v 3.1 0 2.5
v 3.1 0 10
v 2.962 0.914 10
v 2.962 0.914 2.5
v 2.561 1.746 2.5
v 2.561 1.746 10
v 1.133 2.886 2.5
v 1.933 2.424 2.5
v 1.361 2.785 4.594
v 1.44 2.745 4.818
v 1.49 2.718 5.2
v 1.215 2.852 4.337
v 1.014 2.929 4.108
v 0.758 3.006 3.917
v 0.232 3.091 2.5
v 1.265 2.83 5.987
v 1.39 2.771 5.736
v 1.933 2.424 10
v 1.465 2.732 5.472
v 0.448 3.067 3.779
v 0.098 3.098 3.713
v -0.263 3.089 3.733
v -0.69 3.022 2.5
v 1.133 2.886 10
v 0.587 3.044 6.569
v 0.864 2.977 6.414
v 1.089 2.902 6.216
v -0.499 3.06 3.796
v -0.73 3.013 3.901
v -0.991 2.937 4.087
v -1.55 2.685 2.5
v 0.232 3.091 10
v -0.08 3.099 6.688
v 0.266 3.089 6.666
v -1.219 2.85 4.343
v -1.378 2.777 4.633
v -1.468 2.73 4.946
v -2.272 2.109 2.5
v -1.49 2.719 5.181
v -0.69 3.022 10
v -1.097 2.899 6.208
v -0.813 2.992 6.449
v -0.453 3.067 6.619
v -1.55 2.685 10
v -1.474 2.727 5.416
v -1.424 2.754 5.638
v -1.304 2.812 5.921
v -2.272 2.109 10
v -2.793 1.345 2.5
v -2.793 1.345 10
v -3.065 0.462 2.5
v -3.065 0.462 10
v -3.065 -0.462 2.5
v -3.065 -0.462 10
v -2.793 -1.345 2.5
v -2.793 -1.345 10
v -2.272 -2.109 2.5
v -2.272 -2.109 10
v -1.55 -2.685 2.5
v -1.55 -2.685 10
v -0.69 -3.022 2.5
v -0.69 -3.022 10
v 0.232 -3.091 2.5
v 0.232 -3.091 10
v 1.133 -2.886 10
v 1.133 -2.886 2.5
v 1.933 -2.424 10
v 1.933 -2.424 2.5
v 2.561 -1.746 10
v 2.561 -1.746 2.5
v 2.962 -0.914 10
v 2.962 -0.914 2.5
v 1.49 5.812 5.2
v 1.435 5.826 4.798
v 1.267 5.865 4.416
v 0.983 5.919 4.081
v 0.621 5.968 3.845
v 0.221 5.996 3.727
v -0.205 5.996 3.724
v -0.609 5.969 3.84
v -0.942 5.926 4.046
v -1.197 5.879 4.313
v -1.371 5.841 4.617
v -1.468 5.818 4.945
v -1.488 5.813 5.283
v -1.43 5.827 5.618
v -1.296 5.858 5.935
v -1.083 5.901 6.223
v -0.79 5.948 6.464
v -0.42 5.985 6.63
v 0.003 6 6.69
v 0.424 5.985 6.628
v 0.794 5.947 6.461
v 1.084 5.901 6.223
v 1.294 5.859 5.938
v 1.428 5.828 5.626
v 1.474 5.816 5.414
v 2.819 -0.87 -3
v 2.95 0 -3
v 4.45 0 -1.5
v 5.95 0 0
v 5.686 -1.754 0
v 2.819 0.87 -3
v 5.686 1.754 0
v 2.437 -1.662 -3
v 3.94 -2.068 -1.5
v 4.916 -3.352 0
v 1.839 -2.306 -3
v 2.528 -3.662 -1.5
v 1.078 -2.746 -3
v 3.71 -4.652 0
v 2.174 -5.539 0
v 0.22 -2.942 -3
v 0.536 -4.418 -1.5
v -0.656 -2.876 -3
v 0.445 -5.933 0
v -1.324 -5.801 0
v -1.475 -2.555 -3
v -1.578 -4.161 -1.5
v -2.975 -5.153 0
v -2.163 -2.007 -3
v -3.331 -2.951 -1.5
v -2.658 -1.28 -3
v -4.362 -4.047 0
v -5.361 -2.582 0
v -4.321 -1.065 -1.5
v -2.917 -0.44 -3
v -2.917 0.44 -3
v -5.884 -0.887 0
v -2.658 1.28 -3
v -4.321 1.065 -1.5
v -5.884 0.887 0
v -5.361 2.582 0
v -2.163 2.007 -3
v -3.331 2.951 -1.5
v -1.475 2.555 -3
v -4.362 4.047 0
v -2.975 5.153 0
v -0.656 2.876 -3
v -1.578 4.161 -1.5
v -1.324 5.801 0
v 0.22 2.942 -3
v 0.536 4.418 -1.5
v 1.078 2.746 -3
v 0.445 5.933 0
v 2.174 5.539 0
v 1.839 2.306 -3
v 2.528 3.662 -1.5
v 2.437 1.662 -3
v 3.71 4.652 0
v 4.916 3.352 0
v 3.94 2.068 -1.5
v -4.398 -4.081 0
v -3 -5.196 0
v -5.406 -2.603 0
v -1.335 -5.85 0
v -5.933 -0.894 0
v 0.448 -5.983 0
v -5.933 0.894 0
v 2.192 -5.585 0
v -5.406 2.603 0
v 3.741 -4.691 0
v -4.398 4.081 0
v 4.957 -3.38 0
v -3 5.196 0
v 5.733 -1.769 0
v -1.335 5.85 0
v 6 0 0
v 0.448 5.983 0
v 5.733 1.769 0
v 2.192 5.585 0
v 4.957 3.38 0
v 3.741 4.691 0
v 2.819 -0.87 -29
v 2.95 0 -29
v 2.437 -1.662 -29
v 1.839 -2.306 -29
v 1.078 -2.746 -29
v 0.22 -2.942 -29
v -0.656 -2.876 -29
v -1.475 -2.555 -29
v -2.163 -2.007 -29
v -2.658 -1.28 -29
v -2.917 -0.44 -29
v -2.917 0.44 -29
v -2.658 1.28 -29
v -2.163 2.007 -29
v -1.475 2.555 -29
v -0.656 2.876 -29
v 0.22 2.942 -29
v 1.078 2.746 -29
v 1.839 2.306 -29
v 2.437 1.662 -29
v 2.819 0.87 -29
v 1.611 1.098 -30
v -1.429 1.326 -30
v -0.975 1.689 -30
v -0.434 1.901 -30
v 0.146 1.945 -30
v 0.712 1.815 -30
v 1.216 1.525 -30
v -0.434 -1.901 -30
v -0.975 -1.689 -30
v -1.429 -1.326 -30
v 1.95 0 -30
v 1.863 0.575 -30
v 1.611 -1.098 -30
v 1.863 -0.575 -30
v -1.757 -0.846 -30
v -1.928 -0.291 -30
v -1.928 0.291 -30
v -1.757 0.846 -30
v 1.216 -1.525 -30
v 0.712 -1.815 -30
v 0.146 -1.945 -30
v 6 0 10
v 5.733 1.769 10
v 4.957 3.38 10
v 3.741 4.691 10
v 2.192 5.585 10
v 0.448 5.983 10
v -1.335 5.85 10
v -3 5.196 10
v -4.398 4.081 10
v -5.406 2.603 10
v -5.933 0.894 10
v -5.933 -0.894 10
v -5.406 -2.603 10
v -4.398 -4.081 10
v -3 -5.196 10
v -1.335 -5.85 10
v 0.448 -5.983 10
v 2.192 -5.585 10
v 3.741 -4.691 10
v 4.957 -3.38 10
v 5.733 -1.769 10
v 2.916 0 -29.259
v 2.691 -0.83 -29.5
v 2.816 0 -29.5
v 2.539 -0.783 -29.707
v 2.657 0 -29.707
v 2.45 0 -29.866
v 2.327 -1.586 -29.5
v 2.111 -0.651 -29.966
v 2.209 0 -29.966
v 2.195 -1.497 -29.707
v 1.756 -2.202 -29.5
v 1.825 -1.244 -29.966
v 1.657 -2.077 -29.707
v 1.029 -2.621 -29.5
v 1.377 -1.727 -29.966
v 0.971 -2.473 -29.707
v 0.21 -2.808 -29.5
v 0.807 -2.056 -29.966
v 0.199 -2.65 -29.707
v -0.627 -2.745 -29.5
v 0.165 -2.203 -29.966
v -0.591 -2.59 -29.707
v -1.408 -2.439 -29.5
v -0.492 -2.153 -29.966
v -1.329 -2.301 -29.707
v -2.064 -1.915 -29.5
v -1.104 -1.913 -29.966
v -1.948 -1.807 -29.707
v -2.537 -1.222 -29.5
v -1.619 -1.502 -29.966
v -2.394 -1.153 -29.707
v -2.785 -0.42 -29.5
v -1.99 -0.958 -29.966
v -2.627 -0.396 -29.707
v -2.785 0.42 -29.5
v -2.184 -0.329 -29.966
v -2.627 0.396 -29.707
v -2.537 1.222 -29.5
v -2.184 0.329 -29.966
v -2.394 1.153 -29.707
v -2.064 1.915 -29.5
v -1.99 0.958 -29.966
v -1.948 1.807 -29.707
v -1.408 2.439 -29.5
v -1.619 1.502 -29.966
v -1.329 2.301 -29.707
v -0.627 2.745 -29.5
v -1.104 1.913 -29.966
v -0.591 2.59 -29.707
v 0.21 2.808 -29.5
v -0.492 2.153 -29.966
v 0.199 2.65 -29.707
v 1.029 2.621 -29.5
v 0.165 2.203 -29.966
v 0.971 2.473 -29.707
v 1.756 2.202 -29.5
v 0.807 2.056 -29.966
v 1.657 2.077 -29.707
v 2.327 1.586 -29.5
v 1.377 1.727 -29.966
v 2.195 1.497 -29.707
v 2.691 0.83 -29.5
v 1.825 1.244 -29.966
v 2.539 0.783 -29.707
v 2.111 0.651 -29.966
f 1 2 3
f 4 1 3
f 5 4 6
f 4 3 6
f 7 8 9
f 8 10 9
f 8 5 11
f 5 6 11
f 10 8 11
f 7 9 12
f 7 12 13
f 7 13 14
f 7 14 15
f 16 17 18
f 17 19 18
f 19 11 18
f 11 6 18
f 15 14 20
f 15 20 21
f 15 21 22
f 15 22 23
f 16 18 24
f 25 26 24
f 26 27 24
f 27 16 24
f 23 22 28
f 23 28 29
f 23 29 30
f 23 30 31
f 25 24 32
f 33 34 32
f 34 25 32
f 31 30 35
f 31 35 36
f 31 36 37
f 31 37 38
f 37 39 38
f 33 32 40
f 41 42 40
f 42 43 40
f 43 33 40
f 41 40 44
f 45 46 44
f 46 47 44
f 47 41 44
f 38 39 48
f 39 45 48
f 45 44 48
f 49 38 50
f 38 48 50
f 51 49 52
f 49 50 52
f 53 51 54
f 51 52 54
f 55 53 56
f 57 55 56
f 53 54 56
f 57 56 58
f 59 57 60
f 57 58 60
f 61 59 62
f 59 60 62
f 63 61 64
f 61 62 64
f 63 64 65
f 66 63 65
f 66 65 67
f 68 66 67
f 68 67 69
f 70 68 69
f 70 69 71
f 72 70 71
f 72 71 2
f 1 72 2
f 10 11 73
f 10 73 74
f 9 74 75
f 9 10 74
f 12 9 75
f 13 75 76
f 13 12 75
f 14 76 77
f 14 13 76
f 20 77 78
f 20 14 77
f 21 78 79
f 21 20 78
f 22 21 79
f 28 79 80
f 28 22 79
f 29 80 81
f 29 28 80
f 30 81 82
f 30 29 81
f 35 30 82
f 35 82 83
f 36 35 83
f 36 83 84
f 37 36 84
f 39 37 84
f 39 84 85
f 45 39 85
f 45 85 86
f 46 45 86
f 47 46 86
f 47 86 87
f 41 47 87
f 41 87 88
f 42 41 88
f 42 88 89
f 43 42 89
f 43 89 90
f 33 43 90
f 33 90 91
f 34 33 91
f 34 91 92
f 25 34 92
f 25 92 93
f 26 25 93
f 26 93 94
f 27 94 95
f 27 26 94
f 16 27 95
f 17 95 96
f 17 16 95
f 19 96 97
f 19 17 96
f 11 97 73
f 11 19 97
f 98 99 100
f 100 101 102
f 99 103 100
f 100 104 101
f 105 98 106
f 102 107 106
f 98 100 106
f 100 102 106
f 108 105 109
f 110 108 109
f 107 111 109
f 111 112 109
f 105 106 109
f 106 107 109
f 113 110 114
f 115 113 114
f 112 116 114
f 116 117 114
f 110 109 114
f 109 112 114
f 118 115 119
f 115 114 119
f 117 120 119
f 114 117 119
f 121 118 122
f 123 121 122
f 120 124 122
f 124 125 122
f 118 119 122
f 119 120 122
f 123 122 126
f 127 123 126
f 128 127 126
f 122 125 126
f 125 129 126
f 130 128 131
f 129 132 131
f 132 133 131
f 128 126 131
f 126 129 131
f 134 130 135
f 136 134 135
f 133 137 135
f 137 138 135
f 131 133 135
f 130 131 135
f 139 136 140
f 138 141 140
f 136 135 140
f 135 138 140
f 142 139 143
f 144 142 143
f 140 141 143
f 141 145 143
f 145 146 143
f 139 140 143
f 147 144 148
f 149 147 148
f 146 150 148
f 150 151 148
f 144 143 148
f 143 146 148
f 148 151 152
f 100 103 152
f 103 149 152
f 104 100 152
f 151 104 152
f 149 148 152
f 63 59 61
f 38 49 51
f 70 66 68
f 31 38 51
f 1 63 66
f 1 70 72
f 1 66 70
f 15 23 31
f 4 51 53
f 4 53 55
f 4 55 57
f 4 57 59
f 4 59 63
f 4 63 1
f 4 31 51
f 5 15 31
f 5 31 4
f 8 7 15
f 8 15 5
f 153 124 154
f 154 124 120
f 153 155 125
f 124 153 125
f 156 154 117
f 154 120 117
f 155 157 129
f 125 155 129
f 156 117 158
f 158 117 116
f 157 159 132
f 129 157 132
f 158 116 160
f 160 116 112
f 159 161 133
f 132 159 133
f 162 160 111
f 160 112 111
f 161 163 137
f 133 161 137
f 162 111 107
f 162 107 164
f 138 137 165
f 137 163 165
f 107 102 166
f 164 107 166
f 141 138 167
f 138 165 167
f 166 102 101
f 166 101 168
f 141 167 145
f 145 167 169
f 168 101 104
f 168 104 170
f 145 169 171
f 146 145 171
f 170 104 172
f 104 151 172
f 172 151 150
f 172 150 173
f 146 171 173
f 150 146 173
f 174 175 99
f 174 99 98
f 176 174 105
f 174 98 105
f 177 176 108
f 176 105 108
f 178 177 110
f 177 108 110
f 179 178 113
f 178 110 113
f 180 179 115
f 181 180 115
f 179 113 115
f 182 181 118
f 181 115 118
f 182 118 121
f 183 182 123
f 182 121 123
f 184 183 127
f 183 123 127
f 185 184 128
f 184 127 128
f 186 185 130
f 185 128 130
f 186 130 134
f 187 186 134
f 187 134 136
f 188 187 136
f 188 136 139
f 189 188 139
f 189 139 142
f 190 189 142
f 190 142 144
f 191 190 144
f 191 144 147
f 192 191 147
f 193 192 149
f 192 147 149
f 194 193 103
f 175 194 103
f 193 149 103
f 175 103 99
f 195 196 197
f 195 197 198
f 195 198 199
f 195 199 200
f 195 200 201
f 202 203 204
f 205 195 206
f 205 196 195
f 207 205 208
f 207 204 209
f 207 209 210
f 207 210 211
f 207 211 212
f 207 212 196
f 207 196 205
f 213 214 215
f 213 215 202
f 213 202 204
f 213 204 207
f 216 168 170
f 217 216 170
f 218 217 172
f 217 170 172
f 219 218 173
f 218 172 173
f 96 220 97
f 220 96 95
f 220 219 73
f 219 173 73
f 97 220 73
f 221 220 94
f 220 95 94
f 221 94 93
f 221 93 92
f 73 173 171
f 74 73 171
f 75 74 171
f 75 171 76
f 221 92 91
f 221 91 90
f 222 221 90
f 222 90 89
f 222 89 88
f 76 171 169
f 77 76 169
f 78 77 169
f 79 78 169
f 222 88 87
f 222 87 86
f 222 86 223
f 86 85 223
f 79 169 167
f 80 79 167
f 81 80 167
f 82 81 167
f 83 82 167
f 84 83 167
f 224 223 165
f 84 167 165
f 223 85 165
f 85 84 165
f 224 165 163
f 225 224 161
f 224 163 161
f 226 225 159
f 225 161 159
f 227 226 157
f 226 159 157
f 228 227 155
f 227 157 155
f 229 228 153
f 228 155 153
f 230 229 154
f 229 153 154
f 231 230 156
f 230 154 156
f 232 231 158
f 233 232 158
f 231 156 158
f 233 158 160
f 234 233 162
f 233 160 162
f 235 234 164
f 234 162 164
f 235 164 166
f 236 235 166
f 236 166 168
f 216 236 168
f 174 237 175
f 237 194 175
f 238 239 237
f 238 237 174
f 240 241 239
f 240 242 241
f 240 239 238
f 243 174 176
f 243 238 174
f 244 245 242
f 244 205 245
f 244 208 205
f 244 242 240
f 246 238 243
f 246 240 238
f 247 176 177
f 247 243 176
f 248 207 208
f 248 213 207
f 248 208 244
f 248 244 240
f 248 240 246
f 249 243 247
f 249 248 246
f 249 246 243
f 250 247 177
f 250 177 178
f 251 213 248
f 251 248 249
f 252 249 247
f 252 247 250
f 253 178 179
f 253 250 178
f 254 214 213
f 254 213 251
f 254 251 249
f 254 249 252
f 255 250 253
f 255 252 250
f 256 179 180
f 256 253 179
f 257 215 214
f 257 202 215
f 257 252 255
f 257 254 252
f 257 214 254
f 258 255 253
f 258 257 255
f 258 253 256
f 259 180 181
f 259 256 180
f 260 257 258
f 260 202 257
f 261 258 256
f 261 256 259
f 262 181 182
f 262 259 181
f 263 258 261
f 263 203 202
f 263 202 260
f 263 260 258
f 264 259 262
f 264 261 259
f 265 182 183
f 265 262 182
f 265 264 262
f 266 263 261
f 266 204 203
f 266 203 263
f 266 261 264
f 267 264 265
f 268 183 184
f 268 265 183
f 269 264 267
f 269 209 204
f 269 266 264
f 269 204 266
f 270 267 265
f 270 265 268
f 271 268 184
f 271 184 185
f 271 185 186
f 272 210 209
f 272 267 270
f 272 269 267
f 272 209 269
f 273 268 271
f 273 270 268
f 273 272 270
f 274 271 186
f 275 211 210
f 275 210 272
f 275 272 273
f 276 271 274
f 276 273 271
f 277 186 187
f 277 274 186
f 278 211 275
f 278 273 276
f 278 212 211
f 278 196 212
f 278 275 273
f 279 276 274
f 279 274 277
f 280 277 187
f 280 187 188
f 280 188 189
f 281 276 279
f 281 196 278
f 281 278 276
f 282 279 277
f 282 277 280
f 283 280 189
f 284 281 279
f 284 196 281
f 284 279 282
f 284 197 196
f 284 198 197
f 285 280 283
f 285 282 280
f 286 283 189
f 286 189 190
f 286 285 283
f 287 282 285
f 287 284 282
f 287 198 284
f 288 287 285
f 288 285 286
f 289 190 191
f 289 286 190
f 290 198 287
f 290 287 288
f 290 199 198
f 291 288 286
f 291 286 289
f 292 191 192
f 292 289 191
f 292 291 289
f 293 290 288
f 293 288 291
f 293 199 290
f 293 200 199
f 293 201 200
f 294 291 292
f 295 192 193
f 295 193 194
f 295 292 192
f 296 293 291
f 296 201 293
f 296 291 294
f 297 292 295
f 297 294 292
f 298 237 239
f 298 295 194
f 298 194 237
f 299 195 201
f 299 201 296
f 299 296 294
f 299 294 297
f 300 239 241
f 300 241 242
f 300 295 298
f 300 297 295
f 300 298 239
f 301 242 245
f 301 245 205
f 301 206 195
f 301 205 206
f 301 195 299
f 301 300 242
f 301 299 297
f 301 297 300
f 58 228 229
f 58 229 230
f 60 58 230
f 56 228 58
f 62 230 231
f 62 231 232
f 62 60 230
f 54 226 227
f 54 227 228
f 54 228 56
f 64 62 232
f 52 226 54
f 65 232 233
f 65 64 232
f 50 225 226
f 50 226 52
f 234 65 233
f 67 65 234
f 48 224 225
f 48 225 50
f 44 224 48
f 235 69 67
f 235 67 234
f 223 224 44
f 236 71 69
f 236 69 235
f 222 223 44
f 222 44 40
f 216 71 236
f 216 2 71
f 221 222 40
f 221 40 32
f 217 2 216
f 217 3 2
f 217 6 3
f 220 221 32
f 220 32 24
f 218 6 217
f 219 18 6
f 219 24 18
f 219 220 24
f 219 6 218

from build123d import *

# Parameters (mm, degrees)
CYLINDER_R     = 1.49
CYLINDER_DEPTH = 20
SKETCH_R       = 6
PAD_DEPTH      = 10
SKETCH001_R    = 3.1
POCKET_DEPTH   = 7.5
SKETCH002_R    = 2.95
PAD001_DEPTH   = 30
FILLET_R       = 1
CHAMFER_SIZE   = 3


with BuildPart() as cilindro:
    # Cylinder → Cylinder (new body)
    with BuildSketch(Plane(origin=(0, 0, 5.2), x_dir=(1, 0, 0), z_dir=(0, 1, 0))):
        Circle(CYLINDER_R)
    extrude(amount=CYLINDER_DEPTH)


with BuildPart() as cut:
    # Sketch → Pad (new body)
    with BuildSketch(Plane.XY):
        Circle(SKETCH_R)
    extrude(amount=PAD_DEPTH)

    # Sketch001 (on Face3 of Pad) → Pocket (cut)
    with BuildSketch(Plane.XY.offset(10)):
        Circle(SKETCH001_R)
    extrude(amount=-POCKET_DEPTH, mode=Mode.SUBTRACT)

    # Sketch002 (on Face2 of Pocket) → Pad001 (join)
    with BuildSketch(Plane(origin=(0, 0, 0), x_dir=(1, 0, 0), z_dir=(0, 0, -1))):
        Circle(SKETCH002_R)
    extrude(amount=PAD001_DEPTH)

    # Fillet
    fillet_edges = [cut.edges().sort_by_distance(p)[0] for p in [
        (-2.95, 0, -30),
    ]]
    fillet(fillet_edges, radius=FILLET_R)

    # Chamfer
    chamfer_edges = [cut.edges().sort_by_distance(p)[0] for p in [
        (-2.95, 0, 0),
    ]]
    chamfer(chamfer_edges, length=CHAMFER_SIZE)

    # Cut: cut Cilindro
    add(cilindro.part, mode=Mode.SUBTRACT)


solid = cut.part
